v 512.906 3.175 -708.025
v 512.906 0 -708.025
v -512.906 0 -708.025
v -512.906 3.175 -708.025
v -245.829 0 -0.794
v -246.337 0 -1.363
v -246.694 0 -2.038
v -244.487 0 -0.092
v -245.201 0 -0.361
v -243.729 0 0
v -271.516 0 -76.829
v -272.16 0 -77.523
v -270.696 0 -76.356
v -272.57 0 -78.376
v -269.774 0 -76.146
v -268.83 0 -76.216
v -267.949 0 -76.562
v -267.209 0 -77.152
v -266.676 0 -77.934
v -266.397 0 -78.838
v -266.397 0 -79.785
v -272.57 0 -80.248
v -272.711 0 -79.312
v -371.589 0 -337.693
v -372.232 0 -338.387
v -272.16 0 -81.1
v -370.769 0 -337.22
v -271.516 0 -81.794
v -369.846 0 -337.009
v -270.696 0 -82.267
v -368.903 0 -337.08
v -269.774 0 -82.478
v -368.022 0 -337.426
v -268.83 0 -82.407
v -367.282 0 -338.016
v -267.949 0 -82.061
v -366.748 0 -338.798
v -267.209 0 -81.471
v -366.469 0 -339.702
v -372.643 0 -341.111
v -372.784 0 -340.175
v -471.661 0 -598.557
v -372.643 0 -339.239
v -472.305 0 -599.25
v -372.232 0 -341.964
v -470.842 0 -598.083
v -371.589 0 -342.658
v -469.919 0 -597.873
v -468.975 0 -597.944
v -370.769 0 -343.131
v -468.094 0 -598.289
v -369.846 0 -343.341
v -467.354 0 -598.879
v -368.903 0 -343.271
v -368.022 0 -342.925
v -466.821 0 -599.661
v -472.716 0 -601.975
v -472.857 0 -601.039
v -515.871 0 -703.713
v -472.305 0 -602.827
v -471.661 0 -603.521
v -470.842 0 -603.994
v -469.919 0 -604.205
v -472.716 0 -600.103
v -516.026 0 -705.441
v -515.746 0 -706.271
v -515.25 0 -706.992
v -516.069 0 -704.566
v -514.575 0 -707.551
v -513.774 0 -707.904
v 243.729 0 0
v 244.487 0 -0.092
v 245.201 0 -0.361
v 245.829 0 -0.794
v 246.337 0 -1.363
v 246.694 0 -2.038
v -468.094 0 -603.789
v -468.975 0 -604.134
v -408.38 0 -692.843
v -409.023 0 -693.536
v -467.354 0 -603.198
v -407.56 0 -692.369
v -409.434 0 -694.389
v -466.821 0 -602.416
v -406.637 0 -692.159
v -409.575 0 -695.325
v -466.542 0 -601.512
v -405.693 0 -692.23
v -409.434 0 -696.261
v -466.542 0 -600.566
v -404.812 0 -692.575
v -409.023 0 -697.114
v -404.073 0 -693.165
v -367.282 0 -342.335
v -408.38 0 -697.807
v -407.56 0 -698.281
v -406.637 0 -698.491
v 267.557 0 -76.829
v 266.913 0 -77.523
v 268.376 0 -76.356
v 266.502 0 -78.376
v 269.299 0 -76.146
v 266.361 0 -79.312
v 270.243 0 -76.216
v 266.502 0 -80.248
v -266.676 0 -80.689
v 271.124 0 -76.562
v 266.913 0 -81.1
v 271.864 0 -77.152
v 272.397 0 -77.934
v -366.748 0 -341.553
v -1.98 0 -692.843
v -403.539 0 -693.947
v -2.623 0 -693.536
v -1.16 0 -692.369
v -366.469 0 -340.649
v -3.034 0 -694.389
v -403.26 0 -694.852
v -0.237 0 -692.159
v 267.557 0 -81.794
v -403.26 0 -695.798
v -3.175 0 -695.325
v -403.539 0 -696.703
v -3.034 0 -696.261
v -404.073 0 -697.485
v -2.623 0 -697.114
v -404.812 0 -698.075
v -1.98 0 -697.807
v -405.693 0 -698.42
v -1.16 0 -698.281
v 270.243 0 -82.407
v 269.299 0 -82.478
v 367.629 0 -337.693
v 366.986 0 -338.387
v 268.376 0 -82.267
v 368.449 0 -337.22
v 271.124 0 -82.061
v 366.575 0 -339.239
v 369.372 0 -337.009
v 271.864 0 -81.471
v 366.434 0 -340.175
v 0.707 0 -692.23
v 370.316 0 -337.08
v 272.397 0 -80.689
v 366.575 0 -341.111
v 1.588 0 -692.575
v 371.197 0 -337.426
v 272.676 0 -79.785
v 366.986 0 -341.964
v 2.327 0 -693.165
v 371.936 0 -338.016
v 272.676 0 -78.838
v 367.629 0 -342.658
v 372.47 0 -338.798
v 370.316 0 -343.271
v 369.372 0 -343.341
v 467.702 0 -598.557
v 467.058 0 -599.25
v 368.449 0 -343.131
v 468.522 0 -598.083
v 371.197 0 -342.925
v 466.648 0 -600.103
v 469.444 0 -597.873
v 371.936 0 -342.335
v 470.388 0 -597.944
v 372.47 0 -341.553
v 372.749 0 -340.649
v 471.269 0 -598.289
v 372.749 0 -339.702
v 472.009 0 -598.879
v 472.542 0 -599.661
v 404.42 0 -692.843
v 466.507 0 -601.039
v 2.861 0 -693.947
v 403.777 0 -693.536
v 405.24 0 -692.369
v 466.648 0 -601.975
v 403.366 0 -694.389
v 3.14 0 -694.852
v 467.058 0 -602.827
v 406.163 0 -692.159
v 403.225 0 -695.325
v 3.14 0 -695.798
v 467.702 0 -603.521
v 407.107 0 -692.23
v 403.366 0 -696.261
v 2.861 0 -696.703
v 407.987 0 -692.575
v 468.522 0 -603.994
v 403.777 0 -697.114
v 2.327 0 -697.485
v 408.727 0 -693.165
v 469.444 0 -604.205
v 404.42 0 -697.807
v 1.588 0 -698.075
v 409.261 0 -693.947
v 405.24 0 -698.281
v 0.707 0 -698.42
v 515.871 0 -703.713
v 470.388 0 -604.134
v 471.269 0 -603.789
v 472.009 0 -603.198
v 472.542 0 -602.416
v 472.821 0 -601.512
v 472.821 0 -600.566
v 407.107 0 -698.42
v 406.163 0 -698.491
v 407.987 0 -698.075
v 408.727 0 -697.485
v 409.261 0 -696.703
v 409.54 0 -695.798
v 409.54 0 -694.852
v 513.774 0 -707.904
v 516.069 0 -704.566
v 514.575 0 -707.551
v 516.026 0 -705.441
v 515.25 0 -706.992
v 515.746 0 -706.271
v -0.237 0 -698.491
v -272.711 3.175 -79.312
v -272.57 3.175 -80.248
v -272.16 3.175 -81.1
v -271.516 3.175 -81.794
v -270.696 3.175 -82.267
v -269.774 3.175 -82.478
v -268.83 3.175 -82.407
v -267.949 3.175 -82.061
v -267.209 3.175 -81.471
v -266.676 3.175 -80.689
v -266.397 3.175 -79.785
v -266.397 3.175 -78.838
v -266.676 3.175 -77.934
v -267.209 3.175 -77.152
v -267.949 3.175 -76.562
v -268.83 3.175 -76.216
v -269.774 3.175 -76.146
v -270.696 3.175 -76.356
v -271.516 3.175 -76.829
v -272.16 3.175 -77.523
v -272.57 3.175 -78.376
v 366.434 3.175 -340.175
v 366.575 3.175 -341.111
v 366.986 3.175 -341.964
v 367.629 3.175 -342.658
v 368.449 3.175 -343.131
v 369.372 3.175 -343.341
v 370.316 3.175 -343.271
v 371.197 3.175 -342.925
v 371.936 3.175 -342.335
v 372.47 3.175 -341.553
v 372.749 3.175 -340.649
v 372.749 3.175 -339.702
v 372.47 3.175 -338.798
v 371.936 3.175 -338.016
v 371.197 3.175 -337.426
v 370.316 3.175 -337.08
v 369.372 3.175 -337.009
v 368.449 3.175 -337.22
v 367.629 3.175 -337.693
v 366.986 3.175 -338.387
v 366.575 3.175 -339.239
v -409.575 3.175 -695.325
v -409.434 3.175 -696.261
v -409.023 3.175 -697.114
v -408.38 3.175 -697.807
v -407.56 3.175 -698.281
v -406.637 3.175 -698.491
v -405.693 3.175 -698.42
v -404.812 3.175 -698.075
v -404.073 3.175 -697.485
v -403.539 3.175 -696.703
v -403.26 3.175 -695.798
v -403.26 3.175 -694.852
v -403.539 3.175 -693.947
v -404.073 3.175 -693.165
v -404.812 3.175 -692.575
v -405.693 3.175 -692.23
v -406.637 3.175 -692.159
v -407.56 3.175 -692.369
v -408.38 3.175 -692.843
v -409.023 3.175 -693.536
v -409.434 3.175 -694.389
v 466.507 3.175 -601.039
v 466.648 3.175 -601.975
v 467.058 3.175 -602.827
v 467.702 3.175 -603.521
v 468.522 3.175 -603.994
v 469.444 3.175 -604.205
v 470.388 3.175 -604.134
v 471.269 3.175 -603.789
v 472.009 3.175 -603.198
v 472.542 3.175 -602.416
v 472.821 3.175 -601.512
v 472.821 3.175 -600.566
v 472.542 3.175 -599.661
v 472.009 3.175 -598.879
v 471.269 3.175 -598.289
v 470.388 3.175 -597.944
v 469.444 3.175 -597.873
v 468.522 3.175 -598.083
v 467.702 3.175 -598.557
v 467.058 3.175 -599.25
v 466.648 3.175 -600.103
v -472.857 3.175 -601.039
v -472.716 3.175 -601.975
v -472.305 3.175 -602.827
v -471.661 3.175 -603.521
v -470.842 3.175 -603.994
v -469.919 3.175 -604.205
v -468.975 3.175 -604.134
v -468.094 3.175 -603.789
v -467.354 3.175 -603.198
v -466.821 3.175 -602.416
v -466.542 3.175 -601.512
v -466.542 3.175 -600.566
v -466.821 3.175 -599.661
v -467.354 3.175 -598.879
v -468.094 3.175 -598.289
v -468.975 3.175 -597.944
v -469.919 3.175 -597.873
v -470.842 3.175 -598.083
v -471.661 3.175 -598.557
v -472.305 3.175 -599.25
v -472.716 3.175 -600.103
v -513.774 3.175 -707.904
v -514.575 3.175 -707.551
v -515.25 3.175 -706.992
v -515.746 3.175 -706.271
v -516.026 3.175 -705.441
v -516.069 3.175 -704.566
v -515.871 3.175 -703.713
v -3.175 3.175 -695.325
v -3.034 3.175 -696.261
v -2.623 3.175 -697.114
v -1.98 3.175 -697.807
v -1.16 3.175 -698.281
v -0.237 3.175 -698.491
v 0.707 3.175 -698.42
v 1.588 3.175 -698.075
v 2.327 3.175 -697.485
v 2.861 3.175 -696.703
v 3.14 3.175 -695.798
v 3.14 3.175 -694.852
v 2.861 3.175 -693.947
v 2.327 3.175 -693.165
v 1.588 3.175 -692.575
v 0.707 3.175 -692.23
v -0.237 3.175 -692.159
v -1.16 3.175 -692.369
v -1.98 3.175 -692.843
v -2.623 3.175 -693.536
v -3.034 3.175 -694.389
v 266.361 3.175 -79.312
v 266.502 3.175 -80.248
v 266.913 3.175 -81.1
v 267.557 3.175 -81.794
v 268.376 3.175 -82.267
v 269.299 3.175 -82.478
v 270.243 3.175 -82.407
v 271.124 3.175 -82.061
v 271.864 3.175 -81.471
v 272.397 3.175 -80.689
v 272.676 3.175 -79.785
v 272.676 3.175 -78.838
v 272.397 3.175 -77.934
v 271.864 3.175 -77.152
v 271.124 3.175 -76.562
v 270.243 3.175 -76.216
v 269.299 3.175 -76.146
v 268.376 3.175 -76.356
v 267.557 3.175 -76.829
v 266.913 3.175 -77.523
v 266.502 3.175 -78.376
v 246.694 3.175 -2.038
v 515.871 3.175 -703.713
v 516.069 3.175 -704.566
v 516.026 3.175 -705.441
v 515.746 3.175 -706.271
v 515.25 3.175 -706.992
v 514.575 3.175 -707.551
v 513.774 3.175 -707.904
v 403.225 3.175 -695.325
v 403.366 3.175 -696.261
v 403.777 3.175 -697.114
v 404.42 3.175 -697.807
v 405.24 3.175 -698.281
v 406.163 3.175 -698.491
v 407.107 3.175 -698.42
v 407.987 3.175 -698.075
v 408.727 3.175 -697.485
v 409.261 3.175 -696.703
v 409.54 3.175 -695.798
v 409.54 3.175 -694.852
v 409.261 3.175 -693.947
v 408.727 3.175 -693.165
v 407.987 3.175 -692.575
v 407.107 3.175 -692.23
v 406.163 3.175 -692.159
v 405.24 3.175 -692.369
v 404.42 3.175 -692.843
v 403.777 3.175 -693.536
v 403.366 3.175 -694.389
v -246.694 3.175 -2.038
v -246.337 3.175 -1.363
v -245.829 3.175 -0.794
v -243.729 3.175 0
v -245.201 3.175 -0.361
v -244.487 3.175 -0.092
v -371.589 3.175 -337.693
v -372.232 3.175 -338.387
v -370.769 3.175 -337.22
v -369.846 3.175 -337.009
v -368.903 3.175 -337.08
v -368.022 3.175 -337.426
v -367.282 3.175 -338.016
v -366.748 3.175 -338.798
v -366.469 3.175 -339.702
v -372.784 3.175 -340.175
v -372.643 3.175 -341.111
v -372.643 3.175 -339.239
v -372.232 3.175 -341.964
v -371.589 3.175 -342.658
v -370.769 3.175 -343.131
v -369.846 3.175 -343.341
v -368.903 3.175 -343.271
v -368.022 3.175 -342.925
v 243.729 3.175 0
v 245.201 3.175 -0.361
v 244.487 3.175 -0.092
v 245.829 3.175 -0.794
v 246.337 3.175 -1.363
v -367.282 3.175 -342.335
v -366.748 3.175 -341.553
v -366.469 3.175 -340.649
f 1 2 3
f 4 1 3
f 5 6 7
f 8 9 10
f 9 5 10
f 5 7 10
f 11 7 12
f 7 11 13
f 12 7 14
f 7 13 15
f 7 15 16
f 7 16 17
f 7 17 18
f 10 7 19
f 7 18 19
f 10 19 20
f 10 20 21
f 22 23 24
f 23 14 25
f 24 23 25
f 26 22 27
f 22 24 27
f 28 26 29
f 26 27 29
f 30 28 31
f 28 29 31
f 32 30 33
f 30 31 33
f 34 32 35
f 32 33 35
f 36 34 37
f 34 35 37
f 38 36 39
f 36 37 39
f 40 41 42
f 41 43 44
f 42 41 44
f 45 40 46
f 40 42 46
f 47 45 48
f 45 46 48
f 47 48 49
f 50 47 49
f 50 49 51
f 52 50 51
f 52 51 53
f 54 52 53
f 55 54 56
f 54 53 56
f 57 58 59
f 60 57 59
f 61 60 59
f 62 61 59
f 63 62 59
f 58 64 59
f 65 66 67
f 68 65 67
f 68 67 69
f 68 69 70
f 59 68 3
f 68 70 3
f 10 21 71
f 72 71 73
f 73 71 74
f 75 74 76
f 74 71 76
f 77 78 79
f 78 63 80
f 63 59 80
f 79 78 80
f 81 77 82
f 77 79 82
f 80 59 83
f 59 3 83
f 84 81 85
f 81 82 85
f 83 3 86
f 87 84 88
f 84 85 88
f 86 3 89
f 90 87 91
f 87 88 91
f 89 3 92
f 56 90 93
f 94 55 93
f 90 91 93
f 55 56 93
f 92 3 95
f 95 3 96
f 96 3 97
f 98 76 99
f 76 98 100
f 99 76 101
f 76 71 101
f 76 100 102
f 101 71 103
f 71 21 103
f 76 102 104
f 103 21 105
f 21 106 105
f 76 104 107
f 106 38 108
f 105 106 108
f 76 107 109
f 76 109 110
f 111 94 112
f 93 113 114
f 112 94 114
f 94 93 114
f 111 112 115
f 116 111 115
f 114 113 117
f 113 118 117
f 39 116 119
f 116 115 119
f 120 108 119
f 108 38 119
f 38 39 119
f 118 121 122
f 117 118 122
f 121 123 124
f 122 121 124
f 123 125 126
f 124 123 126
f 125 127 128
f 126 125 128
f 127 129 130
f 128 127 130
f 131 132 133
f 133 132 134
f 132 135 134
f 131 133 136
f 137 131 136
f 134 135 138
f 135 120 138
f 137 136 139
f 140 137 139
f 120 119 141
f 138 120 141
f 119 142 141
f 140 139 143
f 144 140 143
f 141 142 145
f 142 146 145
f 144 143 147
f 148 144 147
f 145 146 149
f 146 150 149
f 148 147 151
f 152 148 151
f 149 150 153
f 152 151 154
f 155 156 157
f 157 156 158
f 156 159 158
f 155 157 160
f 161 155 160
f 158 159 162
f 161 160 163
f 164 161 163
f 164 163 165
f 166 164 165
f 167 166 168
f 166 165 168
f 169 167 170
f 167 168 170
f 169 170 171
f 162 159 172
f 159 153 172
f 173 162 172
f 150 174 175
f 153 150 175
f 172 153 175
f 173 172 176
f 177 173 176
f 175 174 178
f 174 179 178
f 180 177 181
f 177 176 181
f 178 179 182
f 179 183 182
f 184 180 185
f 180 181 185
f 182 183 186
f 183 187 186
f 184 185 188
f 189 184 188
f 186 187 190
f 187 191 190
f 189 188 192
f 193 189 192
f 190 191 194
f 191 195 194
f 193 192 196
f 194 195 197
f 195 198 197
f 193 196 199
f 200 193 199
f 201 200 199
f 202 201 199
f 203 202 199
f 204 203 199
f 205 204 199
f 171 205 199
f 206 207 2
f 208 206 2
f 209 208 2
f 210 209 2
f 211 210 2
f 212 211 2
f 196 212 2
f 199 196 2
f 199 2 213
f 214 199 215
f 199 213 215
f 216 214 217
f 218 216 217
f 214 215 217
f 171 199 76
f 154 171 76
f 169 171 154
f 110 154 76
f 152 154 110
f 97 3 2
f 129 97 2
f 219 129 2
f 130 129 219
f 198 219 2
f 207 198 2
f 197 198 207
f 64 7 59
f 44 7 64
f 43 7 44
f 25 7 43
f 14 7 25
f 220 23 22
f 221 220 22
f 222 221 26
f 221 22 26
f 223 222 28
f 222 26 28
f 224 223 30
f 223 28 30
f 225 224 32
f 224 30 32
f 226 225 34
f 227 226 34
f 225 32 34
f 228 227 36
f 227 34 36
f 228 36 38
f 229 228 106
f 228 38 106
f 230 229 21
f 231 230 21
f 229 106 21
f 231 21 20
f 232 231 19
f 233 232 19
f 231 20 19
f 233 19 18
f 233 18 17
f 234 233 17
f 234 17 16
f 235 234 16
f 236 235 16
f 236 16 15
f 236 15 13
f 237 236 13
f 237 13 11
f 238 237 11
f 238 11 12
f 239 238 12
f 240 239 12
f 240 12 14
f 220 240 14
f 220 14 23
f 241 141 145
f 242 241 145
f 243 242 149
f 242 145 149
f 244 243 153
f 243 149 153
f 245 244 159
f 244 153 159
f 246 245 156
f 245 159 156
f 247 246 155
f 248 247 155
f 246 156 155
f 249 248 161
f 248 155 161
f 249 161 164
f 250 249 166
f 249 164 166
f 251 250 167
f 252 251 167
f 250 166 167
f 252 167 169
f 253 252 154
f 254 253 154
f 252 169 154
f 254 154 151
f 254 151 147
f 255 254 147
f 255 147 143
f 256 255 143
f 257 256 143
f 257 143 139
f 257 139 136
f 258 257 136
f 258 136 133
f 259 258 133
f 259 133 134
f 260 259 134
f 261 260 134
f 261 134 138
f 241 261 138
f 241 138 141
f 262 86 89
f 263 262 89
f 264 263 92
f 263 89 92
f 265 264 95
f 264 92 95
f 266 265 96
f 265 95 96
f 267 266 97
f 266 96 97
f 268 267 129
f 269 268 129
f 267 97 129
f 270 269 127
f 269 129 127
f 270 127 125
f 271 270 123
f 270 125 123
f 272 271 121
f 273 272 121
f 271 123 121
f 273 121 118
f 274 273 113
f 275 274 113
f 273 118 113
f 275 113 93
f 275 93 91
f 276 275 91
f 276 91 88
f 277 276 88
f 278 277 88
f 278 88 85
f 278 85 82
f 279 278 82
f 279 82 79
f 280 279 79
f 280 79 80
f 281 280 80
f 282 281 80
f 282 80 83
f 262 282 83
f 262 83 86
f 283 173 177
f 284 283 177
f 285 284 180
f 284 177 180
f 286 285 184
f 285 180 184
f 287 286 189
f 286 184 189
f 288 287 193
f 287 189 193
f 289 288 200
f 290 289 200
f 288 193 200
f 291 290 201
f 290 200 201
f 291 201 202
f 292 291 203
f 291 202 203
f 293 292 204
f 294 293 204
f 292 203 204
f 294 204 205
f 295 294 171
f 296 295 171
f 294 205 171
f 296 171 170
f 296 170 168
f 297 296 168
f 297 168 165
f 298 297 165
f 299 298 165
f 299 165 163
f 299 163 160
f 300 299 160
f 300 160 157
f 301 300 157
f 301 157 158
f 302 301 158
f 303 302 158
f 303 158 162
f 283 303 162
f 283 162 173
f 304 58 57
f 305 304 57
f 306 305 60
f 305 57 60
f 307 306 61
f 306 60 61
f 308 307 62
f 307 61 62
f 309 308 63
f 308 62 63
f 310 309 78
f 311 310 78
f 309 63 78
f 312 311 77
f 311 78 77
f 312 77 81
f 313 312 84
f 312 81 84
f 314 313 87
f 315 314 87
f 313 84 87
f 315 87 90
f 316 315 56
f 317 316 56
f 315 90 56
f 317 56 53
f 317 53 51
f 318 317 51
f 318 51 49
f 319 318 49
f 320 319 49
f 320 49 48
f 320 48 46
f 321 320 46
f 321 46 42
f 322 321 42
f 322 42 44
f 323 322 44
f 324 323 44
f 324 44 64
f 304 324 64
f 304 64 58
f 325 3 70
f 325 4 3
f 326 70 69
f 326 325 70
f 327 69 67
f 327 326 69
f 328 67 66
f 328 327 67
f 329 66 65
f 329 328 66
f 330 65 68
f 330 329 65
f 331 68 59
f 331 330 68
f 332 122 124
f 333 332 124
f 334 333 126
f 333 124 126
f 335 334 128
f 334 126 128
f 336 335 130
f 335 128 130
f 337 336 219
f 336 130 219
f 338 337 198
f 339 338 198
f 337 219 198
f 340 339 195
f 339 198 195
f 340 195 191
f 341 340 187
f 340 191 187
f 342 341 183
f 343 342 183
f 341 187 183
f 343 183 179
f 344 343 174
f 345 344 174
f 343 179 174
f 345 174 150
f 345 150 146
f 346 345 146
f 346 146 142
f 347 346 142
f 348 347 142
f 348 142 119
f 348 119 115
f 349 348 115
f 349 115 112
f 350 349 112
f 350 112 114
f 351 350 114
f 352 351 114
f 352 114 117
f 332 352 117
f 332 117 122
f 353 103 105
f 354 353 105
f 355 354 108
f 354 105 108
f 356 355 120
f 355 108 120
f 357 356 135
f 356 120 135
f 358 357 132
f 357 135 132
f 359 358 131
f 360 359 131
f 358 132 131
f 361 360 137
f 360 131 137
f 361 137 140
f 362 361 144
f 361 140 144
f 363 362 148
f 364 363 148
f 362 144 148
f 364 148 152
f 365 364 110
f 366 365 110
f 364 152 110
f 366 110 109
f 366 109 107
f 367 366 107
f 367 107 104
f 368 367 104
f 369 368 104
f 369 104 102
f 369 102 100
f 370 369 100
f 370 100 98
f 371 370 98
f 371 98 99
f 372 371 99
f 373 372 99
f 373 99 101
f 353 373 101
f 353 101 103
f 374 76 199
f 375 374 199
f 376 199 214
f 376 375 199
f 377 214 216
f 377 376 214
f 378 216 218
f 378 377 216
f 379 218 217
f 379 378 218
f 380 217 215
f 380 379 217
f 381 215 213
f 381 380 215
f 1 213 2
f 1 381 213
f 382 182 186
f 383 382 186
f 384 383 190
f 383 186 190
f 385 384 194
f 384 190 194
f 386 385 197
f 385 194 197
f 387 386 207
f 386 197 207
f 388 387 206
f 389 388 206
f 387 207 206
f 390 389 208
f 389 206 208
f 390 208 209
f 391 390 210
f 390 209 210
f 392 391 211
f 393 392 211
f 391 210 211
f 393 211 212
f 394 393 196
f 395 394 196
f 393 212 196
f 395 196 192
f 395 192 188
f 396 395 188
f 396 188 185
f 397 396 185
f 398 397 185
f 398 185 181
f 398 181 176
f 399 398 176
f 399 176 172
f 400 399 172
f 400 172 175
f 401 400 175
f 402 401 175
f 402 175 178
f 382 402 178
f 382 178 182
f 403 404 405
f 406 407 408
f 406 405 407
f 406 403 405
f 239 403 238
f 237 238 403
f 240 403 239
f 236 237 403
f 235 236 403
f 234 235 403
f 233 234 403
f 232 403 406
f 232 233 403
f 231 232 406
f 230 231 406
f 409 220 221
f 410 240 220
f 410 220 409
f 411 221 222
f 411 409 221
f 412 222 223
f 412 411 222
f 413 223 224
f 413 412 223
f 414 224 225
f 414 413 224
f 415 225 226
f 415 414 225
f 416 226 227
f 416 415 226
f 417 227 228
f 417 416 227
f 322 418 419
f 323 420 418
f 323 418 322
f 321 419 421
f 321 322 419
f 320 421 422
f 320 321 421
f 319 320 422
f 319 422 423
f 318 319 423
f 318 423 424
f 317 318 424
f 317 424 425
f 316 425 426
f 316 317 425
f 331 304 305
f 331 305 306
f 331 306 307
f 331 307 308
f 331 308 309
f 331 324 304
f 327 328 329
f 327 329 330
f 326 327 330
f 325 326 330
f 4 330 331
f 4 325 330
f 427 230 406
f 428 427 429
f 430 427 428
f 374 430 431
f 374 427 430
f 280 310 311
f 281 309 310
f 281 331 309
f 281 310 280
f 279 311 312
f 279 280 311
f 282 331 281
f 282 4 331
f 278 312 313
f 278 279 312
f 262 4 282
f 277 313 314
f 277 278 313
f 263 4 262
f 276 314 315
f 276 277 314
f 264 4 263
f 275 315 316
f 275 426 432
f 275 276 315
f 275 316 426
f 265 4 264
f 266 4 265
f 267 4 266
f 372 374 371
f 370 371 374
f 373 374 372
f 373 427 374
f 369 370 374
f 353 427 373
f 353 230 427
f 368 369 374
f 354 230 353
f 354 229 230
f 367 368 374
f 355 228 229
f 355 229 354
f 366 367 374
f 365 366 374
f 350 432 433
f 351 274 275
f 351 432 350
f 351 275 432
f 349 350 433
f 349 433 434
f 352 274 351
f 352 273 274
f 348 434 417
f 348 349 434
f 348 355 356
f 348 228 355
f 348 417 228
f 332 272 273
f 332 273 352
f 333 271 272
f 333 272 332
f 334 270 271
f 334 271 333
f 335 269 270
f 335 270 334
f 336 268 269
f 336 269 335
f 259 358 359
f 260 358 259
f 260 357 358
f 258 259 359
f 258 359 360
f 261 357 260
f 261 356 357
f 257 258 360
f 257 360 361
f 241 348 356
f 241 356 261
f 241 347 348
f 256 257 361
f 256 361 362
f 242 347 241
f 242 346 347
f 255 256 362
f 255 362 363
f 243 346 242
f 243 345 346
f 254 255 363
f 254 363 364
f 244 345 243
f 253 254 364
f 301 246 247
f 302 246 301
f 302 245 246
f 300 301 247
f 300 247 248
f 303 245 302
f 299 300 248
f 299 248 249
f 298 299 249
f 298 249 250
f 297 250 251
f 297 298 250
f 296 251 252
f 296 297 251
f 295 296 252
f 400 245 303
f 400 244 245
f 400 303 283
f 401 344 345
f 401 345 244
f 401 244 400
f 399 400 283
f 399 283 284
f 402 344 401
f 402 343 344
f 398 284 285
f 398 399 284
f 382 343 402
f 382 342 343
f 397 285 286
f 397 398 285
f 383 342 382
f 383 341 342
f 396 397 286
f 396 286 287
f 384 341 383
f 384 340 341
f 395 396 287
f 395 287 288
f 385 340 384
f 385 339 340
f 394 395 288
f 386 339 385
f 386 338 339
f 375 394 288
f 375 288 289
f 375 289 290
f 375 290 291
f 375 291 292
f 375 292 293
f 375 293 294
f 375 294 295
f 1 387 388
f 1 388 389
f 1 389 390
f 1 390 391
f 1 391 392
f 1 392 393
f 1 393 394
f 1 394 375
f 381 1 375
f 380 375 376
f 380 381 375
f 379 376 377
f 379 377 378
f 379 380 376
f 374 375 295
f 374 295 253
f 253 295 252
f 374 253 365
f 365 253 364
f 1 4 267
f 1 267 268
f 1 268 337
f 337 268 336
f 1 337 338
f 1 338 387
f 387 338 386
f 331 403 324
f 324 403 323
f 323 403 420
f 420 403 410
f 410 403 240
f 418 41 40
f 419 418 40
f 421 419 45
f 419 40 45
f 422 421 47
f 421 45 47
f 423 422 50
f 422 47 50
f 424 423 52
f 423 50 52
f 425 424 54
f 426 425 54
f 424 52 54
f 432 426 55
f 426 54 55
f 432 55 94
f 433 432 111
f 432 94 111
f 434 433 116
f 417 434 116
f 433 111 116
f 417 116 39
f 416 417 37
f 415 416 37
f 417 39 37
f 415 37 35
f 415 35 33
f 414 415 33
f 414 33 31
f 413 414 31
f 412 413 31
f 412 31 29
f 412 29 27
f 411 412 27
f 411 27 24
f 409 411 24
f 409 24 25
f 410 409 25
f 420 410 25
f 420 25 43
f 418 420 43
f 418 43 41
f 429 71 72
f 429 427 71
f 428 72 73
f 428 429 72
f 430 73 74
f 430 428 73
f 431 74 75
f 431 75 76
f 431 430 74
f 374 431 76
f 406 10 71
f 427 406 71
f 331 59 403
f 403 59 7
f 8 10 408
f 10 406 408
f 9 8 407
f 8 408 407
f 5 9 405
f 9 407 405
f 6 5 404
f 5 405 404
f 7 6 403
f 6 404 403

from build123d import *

# Parameters (mm, degrees)
BOSS_EXTRUDE1_DEPTH         = 3.175
FILLET1_R                   = 3.175
F_1_4_0_25_DIAMETER_HOLE1_D = 6.35


with BuildPart() as part:
    # Sketch1 → Boss-Extrude1 (new body)
    with BuildSketch(Plane(origin=(0, 0, 0), x_dir=(1, 0, 0), z_dir=(0, 1, 0))):
        Polygon((-245.911961207, 0), (245.911961207, 0), (517.525, 708.025), (-517.525, 708.025), align=None)
    extrude(amount=BOSS_EXTRUDE1_DEPTH)

    # Fillet1
    fillet1_edges = [part.edges().sort_by_distance(p)[0] for p in [
        (-517.525, 1.5875, -708.025),
        (517.525, 1.5875, -708.025),
        (245.911961207, 1.5875, 0),
        (-245.911961207, 1.5875, 0),
    ]]
    fillet(fillet1_edges, radius=FILLET1_R)

    # 1/4 (0.25) Diameter Hole1 (through all)
    with Locations(Plane(origin=(0, 3.175, 0), x_dir=(1, 0, 0), z_dir=(0, 1, 0))):
        with Locations((-406.4, 695.325), (0, 695.325), (406.4, 695.325), (-469.681706805, 601.038913991), (-369.60903133, 340.175310506), (-269.536355855, 79.311707021), (269.536355855, 79.311707021), (369.60903133, 340.175310506), (469.681706805, 601.038913991)):
            Hole(F_1_4_0_25_DIAMETER_HOLE1_D / 2)


solid = part.part
